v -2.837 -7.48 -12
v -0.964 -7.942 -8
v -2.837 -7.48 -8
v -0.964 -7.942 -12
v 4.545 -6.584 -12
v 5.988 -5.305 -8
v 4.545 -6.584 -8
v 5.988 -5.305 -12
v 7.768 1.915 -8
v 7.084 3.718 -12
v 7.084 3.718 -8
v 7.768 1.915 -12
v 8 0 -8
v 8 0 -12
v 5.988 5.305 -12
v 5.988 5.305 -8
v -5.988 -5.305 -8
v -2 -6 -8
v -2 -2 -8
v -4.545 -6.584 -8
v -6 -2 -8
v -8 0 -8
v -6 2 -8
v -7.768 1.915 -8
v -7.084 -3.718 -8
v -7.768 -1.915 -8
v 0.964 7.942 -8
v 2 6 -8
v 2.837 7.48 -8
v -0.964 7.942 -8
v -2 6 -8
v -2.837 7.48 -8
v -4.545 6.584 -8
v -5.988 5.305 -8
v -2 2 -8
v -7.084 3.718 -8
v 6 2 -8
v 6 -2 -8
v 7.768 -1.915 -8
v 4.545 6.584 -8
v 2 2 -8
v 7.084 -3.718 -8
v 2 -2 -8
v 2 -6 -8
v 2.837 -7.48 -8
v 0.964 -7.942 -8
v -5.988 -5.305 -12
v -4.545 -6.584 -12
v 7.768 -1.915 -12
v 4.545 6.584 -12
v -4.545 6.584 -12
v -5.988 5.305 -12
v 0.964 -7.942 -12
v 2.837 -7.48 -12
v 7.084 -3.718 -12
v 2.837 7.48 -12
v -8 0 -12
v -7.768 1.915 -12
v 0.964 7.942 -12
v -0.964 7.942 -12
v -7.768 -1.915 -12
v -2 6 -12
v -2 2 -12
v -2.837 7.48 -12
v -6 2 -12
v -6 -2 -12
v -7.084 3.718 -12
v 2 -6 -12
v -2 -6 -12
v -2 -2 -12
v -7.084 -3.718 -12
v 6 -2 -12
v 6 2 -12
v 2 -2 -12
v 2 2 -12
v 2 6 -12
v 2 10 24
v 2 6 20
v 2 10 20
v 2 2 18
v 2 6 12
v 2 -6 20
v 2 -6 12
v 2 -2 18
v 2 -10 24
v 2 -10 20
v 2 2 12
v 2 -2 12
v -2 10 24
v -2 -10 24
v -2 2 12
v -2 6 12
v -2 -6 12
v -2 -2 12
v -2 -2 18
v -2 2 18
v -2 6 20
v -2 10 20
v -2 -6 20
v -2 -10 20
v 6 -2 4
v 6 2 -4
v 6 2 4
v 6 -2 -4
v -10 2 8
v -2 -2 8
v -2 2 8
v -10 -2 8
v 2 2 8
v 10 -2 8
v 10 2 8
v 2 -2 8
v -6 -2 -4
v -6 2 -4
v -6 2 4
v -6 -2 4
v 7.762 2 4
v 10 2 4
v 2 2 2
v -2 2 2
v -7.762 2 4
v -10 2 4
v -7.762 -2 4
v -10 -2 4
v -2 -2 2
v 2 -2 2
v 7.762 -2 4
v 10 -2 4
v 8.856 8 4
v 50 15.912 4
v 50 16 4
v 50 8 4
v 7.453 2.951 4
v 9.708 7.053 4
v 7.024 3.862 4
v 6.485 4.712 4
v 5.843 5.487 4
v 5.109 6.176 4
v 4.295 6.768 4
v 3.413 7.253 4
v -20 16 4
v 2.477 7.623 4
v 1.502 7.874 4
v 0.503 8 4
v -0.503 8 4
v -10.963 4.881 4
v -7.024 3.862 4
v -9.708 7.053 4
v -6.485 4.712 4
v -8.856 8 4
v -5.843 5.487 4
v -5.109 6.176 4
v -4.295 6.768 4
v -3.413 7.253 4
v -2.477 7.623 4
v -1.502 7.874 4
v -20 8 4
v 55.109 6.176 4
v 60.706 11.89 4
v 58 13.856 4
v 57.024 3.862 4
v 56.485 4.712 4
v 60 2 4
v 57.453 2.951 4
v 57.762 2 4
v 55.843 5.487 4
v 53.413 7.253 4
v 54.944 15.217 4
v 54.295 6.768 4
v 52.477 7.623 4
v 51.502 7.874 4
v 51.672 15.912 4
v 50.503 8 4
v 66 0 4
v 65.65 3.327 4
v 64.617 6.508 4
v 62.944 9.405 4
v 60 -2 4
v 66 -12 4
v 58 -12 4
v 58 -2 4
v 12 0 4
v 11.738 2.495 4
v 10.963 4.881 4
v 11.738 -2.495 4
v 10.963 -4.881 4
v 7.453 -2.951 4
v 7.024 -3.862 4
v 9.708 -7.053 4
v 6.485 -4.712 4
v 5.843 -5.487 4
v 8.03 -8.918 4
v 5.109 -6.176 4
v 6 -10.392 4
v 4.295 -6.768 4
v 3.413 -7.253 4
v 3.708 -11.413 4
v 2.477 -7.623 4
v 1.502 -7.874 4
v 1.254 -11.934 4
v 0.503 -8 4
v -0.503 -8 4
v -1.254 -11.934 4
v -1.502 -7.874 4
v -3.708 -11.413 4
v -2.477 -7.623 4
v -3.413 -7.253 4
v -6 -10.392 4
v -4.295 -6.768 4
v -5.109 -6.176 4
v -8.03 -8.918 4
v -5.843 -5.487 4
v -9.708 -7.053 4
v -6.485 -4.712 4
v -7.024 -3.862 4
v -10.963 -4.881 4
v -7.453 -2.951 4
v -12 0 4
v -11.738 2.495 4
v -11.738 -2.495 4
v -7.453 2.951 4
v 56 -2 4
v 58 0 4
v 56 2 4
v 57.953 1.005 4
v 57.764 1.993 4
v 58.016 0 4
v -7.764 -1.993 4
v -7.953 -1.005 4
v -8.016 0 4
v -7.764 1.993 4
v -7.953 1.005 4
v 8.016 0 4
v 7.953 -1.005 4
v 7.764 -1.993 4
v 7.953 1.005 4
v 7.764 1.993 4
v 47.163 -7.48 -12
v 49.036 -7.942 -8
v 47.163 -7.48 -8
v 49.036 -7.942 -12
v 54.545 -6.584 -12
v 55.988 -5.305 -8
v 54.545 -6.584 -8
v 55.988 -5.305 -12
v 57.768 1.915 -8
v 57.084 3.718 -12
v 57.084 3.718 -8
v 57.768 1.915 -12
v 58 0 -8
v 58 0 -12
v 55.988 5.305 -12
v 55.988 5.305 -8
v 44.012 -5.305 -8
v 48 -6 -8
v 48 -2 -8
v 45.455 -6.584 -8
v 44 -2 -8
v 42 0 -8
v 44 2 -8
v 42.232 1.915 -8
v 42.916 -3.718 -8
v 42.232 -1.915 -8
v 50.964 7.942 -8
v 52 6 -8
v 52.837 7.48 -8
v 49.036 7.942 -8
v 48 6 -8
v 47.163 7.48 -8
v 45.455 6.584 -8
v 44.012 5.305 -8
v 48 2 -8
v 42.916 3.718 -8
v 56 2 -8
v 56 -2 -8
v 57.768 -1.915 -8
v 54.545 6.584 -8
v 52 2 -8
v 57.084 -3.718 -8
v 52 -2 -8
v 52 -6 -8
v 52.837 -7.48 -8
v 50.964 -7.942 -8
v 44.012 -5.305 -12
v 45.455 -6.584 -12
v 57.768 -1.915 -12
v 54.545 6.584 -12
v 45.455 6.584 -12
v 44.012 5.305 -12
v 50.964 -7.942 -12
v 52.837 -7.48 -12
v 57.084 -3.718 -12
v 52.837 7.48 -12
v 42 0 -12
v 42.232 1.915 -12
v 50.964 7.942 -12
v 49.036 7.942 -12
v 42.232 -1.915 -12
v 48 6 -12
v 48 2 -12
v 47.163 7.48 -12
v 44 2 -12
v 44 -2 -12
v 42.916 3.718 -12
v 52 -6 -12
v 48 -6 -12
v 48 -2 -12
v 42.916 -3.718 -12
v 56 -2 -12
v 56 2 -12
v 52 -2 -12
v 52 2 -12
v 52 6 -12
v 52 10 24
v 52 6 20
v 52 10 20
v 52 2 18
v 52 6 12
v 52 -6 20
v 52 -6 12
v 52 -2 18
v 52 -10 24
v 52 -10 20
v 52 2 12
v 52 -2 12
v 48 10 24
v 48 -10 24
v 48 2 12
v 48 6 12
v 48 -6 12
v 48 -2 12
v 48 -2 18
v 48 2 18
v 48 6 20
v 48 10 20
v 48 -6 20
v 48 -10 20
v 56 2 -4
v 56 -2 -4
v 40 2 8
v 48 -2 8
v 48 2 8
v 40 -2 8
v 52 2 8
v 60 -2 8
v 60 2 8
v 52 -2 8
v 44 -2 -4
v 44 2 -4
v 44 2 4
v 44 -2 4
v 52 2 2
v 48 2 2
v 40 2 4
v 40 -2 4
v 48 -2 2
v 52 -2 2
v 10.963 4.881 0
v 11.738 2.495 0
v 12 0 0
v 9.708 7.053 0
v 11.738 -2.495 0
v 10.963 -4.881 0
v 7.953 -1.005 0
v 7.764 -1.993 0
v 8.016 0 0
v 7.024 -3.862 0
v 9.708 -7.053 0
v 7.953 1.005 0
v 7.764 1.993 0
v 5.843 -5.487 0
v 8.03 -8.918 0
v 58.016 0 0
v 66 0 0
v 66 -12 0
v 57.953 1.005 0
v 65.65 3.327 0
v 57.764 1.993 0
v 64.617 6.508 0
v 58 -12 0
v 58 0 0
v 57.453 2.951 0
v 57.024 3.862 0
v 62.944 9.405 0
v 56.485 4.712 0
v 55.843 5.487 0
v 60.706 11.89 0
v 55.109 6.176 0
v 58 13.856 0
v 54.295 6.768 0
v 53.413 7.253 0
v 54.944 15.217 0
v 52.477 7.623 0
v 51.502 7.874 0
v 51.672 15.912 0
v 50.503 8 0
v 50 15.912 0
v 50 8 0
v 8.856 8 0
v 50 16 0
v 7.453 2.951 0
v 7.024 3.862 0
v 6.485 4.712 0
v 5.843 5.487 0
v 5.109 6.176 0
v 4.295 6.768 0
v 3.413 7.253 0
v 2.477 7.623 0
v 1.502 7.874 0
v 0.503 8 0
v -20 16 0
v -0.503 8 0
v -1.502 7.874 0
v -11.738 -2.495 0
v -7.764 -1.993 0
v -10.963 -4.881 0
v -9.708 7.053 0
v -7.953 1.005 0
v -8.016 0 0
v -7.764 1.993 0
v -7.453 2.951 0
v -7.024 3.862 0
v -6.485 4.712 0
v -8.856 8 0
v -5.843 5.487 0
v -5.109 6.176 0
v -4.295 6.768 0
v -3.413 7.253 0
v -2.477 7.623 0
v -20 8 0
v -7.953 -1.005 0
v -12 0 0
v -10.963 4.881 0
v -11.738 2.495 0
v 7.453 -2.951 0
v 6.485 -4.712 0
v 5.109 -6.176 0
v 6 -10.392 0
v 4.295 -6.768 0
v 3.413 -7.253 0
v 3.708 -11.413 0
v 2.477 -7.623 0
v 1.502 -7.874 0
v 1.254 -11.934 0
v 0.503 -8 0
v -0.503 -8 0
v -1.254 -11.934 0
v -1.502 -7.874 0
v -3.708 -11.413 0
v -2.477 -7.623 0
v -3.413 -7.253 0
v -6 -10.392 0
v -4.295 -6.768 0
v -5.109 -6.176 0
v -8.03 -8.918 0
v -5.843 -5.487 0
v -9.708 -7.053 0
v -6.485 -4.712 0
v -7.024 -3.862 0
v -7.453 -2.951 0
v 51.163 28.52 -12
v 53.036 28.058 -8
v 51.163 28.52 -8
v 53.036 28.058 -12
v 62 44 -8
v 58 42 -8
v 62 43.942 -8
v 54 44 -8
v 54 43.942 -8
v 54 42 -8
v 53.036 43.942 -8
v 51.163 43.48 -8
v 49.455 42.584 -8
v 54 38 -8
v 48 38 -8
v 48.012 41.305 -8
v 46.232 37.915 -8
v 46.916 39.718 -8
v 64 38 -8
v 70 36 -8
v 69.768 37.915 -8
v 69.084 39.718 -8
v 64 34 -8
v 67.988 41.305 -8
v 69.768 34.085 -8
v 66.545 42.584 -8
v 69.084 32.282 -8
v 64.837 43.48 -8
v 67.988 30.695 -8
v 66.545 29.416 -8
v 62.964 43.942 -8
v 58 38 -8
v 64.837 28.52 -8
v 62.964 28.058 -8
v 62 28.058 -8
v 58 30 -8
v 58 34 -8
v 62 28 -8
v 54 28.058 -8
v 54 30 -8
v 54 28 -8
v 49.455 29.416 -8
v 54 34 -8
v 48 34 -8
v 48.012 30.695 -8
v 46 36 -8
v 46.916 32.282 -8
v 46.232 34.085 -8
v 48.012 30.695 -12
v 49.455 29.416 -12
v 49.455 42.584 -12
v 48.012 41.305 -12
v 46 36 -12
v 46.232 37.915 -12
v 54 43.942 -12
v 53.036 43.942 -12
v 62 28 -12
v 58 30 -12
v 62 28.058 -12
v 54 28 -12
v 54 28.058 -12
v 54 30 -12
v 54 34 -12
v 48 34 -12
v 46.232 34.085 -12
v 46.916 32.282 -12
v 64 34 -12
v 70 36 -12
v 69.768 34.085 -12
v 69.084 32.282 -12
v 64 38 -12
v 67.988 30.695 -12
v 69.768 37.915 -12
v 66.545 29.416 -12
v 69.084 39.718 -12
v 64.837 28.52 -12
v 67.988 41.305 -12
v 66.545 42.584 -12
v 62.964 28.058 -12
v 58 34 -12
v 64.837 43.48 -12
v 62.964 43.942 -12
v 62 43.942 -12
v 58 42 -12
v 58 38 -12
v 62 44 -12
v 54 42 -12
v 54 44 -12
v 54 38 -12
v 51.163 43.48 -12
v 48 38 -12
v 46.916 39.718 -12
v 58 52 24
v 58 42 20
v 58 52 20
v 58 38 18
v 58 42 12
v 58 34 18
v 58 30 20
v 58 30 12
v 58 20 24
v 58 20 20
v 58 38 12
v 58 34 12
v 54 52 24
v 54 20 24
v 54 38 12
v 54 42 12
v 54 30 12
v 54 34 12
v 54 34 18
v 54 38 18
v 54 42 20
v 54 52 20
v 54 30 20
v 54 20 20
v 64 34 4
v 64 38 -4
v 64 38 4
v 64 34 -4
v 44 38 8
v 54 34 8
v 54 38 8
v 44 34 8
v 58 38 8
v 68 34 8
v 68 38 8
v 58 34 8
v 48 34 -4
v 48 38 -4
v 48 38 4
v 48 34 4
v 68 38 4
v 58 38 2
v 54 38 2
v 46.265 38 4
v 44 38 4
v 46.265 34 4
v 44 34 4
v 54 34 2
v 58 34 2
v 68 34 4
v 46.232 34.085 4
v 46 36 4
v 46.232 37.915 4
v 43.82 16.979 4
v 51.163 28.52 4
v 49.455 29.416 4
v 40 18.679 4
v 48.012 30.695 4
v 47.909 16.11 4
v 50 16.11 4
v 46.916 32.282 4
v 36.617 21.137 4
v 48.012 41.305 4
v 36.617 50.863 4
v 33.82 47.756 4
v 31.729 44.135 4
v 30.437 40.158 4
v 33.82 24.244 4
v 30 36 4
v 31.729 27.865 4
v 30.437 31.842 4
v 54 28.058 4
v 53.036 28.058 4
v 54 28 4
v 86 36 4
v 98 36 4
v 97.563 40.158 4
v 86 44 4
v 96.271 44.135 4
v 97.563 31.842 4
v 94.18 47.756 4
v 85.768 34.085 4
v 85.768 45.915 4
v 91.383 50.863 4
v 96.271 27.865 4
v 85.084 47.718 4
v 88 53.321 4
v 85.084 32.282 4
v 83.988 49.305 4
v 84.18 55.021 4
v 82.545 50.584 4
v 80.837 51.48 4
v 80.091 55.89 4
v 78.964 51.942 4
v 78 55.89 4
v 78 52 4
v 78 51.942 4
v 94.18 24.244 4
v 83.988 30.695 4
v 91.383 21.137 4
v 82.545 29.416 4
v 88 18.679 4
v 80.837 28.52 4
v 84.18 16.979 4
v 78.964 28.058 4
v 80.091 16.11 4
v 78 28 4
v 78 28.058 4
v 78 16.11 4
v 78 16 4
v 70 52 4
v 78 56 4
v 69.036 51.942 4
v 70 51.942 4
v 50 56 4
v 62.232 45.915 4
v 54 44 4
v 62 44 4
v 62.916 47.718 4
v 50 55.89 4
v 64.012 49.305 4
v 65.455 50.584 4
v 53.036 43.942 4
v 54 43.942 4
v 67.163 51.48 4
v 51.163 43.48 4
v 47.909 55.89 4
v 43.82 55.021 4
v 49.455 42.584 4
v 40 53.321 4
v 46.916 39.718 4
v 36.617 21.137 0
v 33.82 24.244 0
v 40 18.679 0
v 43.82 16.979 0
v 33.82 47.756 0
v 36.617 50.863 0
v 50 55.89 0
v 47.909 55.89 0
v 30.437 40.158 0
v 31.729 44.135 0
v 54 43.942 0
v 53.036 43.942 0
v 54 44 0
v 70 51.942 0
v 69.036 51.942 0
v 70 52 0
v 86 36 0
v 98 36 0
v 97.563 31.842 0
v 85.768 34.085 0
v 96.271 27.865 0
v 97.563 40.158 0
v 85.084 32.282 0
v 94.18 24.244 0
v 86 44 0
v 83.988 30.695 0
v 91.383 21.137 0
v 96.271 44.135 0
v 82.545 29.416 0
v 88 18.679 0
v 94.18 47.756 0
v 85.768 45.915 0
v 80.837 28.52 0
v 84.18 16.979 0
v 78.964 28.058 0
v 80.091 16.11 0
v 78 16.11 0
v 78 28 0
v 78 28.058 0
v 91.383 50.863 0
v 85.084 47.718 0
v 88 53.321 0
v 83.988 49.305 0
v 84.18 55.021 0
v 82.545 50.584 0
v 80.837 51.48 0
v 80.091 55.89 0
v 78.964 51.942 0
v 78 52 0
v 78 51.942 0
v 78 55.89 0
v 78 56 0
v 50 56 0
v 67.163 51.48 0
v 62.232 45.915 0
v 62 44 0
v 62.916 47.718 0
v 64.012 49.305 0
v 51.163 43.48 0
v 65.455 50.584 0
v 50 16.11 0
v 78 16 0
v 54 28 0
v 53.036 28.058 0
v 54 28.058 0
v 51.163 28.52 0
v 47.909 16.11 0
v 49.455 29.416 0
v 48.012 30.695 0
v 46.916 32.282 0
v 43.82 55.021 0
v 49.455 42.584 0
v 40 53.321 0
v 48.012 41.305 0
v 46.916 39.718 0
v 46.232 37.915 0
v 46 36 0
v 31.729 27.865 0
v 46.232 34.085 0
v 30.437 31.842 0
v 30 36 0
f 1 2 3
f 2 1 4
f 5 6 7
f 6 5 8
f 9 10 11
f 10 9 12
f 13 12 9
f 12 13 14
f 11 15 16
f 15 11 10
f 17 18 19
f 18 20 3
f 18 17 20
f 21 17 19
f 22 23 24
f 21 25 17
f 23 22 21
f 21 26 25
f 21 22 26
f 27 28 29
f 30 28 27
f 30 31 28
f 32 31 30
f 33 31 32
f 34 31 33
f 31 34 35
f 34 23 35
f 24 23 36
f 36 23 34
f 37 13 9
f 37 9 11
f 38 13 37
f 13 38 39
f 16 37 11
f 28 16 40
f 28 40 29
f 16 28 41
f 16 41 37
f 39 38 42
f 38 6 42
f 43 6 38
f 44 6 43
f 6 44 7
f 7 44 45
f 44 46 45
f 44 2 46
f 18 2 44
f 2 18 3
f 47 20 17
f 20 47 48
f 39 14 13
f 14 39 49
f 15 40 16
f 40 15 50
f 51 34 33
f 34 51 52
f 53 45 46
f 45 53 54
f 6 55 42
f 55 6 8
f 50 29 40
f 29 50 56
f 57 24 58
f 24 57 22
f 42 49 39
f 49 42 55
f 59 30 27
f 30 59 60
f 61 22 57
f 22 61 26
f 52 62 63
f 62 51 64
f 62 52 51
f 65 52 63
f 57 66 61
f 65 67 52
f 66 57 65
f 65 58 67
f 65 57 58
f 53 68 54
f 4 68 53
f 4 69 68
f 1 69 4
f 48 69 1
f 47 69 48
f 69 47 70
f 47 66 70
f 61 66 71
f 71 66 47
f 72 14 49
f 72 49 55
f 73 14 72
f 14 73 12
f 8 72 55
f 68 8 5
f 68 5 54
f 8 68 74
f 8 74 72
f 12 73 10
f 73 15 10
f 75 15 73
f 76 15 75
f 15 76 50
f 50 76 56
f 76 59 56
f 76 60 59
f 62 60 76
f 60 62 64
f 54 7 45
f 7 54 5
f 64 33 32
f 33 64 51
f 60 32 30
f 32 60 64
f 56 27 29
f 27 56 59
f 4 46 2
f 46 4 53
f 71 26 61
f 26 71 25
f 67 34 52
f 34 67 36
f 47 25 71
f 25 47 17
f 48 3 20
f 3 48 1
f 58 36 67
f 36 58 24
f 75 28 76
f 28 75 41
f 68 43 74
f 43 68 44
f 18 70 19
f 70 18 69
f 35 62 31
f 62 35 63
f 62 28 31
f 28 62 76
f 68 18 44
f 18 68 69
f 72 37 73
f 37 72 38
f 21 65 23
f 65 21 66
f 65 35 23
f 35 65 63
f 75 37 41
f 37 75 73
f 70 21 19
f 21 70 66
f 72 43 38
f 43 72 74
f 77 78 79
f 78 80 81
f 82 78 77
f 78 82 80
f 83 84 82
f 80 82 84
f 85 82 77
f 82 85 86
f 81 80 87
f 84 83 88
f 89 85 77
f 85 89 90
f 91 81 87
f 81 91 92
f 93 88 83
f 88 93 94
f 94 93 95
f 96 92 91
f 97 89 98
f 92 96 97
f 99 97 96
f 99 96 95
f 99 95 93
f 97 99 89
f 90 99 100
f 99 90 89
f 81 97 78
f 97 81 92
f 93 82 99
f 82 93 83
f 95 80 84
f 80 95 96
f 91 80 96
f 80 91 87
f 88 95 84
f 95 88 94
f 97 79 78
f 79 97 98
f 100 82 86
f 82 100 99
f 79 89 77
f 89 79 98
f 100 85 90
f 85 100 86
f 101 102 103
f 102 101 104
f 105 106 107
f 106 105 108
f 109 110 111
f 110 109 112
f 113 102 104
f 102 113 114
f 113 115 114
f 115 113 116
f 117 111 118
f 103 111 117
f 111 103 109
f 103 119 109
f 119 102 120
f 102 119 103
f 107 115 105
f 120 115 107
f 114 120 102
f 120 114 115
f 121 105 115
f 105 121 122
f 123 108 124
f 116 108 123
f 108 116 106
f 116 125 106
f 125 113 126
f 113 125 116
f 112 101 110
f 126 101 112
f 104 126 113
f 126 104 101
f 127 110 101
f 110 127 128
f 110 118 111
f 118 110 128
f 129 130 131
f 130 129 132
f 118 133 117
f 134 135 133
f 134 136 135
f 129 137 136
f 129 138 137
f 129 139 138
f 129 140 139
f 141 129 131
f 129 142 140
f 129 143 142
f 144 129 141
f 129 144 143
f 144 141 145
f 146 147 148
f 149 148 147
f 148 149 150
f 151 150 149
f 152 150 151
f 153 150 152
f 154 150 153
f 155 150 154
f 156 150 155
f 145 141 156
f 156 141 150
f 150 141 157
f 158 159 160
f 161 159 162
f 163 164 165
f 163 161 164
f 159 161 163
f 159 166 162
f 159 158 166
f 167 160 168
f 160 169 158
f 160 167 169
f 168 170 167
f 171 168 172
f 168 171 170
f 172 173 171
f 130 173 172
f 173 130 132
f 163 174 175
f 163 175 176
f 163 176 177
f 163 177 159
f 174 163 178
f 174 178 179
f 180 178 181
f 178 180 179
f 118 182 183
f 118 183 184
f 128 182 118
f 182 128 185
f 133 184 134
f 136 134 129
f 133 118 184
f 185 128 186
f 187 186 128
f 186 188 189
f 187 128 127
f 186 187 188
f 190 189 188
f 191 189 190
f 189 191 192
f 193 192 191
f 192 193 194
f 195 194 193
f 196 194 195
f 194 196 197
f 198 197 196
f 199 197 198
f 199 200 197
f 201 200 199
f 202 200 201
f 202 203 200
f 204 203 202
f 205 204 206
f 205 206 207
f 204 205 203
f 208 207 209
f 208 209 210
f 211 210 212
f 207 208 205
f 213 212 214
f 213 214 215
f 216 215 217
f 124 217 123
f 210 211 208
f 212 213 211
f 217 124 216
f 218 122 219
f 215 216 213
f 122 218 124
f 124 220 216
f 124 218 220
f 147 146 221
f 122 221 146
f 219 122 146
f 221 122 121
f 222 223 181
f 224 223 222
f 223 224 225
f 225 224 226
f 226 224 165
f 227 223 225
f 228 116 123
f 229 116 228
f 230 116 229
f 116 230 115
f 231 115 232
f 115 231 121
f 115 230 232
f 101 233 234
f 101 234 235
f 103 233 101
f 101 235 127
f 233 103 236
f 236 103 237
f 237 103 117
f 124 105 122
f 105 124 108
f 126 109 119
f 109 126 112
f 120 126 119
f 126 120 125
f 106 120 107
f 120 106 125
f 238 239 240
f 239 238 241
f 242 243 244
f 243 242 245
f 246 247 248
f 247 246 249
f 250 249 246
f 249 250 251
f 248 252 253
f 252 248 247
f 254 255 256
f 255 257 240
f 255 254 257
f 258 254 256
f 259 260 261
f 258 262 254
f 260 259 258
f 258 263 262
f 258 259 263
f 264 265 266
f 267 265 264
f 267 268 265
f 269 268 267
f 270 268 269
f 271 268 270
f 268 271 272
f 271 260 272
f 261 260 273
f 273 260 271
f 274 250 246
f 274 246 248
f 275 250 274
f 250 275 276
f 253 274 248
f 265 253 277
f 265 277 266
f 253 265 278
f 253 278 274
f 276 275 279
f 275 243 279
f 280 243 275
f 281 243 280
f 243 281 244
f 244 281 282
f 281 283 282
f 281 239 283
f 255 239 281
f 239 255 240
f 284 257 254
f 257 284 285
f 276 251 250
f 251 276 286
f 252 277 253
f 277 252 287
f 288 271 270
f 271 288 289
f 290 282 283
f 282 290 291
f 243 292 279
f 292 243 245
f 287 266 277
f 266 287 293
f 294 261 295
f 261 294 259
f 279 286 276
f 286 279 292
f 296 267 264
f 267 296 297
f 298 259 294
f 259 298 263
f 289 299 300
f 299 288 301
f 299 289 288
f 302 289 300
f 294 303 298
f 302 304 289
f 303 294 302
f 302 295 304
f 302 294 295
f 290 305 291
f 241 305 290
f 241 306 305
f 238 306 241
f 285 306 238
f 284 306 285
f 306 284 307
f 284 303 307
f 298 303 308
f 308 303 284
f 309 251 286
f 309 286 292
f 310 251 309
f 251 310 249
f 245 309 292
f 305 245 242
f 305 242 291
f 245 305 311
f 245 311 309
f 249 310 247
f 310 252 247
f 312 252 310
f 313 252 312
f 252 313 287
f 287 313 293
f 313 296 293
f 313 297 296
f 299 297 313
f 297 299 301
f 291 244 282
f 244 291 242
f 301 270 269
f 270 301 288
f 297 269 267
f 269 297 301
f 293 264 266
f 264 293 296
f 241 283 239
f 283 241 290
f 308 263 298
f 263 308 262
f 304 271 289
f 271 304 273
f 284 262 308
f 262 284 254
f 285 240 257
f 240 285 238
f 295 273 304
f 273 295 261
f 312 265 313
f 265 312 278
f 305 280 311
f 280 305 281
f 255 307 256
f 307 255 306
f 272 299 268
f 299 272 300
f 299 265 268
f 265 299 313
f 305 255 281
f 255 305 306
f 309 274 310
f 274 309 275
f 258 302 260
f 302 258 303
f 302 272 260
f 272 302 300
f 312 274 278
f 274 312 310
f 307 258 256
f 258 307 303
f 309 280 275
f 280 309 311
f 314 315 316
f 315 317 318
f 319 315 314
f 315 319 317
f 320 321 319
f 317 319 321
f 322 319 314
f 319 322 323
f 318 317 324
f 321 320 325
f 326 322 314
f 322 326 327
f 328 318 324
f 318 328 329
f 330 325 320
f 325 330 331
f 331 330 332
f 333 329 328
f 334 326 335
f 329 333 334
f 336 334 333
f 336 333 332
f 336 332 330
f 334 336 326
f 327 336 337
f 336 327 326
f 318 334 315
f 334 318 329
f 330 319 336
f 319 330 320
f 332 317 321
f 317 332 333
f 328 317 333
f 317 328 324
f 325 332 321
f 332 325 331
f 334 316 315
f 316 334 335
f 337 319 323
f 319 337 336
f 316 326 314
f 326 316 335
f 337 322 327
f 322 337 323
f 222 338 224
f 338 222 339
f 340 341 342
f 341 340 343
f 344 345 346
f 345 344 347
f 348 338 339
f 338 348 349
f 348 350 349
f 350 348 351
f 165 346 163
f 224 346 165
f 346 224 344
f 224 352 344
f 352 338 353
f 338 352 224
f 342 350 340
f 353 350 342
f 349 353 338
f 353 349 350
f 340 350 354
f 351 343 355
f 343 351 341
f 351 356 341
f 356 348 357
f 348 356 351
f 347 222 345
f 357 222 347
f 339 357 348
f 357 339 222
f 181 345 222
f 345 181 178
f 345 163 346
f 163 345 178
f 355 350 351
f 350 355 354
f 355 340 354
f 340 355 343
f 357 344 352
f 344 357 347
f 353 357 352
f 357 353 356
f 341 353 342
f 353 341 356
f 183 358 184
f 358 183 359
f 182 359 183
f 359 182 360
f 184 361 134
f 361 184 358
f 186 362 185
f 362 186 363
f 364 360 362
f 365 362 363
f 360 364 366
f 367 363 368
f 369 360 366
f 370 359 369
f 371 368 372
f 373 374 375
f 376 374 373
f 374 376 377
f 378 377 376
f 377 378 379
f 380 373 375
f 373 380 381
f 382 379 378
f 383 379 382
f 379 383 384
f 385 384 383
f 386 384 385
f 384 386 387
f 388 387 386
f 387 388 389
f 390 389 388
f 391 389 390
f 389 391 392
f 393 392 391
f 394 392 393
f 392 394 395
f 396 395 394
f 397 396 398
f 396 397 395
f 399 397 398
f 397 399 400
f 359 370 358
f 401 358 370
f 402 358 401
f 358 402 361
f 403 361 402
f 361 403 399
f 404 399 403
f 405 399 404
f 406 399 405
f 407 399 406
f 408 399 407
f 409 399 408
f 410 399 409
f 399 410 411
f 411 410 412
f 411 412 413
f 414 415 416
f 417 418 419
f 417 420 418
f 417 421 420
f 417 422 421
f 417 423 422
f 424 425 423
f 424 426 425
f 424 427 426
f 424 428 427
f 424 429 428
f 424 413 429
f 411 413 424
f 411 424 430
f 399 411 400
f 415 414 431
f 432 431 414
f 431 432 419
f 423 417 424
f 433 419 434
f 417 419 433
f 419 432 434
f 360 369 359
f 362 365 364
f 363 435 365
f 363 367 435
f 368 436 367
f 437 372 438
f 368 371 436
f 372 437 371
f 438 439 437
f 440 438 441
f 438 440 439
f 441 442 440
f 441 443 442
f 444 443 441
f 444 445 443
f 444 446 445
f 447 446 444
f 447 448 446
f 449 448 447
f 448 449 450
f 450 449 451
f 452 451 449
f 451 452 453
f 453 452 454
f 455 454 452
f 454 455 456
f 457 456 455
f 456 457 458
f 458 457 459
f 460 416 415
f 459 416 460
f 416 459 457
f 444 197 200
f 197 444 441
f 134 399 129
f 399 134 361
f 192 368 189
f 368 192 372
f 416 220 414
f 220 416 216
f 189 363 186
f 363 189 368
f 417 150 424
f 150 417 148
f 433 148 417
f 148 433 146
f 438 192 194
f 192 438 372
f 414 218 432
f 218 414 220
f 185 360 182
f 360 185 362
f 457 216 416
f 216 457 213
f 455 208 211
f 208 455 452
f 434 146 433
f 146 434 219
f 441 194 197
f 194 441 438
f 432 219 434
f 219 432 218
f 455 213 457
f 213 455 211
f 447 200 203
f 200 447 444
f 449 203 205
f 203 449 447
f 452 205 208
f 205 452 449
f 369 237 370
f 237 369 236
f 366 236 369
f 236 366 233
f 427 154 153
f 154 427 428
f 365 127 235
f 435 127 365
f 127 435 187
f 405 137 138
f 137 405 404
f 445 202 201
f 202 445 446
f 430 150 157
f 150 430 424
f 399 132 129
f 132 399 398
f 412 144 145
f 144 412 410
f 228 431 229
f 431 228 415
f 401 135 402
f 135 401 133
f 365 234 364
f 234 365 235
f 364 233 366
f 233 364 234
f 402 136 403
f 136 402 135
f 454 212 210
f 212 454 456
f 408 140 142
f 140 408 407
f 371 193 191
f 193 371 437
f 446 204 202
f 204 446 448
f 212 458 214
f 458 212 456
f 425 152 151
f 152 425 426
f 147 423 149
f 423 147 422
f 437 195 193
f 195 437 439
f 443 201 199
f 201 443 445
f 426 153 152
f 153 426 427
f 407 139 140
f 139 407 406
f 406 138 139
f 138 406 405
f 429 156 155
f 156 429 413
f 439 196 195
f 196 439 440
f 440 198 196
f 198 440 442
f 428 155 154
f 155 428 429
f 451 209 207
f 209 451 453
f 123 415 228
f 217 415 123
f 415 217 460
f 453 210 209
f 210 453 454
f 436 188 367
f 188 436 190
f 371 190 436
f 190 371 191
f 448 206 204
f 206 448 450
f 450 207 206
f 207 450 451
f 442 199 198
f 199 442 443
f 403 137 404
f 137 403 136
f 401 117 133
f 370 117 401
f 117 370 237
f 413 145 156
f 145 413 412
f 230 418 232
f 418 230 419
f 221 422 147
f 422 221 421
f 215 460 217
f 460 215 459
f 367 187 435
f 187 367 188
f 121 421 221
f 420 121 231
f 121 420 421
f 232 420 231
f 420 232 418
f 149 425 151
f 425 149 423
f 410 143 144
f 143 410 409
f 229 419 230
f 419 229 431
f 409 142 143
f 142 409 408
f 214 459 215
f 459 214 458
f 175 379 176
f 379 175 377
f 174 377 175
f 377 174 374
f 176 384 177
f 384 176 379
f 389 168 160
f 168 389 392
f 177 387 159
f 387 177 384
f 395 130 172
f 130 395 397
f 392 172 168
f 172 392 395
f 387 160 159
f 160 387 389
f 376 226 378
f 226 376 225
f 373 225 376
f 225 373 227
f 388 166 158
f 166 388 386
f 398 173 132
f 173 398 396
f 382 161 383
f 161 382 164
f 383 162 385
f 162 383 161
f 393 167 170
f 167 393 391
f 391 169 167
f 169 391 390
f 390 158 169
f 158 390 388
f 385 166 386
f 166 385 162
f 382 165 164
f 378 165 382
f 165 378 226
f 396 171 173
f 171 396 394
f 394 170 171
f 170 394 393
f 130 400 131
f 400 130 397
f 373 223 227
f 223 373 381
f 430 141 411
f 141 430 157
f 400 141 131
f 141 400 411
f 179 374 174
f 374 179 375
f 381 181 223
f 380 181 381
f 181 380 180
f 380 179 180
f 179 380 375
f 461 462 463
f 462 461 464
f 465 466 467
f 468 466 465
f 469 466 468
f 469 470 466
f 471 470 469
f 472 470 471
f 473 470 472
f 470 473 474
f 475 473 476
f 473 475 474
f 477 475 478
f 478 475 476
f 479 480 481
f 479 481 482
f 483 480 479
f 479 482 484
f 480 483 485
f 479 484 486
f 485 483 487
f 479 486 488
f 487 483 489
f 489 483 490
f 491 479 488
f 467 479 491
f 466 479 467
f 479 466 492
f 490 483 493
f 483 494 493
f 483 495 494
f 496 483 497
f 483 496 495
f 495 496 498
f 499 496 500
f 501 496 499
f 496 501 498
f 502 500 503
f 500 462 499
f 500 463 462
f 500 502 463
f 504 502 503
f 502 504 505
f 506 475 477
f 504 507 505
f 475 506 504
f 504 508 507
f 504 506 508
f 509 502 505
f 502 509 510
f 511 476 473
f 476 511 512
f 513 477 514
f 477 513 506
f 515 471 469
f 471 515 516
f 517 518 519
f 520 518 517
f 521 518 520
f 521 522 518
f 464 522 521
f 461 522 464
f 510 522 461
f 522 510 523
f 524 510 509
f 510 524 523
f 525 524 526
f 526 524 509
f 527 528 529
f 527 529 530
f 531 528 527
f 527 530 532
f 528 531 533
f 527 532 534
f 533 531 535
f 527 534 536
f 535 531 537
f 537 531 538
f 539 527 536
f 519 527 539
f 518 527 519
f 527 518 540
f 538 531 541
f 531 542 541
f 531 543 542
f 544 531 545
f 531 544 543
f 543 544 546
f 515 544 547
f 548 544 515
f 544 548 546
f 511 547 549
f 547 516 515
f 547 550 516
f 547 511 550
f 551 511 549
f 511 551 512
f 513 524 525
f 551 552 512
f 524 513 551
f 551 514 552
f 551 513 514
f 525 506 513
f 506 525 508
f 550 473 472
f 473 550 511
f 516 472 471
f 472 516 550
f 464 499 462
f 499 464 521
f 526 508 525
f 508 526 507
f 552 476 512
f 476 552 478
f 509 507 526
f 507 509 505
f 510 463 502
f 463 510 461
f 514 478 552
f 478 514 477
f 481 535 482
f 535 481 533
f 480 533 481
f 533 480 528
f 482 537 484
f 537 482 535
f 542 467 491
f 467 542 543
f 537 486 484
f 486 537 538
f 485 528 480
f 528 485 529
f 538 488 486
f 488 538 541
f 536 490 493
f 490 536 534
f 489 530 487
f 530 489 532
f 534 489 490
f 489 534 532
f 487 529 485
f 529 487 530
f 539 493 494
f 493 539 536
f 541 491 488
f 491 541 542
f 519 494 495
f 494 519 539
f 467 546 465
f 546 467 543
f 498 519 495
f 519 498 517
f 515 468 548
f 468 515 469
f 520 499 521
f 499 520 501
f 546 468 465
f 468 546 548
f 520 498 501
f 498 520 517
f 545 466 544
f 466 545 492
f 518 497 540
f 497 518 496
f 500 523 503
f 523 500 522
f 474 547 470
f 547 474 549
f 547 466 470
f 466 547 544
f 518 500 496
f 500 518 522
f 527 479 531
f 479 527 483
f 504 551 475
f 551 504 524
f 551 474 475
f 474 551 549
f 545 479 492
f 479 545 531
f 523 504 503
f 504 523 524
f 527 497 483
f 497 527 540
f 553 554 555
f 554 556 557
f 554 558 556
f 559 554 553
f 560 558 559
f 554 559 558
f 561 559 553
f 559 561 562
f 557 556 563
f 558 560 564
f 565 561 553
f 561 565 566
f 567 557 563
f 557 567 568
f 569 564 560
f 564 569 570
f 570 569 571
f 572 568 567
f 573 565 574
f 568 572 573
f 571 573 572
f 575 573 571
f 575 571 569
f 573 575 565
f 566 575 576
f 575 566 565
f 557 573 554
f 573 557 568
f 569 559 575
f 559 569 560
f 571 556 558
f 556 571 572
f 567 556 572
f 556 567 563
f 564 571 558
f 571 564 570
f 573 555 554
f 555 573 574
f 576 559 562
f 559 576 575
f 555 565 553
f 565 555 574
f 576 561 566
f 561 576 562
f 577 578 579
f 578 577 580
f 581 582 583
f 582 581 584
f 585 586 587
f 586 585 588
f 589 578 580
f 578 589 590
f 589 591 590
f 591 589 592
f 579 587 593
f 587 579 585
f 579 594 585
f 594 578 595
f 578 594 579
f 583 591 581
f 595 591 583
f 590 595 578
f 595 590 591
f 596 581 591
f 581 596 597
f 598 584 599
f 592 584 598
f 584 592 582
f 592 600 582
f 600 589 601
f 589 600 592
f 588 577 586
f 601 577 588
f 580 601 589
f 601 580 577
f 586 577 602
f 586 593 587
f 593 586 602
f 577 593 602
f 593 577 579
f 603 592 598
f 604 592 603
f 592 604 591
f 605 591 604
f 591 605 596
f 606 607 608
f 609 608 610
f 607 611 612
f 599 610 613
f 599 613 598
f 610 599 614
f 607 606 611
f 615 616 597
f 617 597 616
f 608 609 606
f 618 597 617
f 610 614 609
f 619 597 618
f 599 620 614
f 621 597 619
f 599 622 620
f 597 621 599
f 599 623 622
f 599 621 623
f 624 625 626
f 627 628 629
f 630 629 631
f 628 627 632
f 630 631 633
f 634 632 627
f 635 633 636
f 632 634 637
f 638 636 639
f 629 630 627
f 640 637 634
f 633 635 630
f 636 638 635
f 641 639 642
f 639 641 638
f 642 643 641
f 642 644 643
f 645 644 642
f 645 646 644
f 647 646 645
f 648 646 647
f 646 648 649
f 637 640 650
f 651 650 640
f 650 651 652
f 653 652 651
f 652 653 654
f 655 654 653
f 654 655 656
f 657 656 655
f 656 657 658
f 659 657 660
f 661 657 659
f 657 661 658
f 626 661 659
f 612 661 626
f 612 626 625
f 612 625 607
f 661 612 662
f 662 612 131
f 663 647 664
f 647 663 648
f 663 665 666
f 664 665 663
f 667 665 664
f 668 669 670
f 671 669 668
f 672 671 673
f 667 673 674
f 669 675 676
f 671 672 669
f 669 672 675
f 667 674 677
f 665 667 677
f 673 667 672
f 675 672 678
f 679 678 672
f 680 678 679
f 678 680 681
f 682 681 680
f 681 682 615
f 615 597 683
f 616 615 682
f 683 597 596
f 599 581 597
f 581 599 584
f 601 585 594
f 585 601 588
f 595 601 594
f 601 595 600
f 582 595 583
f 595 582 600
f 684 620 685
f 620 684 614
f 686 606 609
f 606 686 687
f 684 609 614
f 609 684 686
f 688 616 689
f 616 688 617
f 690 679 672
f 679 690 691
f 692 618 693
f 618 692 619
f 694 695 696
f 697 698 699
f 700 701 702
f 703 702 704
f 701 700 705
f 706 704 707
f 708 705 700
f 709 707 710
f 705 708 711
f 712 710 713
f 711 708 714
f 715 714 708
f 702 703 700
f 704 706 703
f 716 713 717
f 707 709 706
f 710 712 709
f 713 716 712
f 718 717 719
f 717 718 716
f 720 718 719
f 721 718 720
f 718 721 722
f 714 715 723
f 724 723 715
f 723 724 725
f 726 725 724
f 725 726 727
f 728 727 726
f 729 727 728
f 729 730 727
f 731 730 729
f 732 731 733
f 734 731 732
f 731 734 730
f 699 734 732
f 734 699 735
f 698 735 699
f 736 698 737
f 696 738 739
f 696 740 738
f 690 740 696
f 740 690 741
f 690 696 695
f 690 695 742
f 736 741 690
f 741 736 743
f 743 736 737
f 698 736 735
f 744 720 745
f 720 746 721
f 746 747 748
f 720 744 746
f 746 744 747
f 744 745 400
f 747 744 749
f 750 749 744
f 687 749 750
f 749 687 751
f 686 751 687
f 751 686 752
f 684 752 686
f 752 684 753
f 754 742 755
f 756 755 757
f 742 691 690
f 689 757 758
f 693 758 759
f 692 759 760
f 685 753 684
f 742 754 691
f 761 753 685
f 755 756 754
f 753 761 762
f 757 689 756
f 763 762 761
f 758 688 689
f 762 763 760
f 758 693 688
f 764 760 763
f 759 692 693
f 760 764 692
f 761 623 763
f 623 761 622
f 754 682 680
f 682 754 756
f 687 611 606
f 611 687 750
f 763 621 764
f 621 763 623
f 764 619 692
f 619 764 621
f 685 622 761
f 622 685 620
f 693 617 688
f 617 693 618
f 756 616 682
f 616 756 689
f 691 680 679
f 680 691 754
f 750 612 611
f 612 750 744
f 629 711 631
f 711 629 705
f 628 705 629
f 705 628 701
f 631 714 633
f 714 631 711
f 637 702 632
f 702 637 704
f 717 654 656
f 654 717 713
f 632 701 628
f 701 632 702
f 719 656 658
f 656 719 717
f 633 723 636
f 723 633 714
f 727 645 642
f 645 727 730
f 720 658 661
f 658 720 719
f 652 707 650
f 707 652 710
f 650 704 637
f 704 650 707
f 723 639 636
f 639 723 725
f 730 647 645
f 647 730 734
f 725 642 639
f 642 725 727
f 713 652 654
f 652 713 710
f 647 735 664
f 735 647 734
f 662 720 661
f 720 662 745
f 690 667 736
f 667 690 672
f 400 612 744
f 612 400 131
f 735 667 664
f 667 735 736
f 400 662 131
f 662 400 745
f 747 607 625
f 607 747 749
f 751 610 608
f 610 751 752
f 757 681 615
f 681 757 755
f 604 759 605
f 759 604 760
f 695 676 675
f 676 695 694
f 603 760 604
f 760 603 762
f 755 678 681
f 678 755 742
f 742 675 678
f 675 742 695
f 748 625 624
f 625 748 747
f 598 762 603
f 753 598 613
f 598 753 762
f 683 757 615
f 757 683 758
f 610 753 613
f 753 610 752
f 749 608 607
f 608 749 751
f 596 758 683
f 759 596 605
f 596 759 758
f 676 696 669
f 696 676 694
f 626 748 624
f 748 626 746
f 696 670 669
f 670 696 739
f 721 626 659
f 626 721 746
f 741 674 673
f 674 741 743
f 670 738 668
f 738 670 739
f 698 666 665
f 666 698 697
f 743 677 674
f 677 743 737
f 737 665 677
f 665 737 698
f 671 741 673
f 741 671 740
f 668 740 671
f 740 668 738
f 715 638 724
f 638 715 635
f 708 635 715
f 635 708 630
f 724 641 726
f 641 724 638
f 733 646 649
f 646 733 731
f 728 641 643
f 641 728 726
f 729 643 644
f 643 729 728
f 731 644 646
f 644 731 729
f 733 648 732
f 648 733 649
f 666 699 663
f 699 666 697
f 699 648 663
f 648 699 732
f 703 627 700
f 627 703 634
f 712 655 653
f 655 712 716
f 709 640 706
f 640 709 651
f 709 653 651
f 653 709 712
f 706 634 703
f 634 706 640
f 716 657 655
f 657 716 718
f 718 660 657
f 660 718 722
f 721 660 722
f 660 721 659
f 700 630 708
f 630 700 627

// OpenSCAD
// file: utils/cylinder-outer.scad
module cylinder_outer(height,radius,fn){
  fudge = 1/cos(180/fn);
  cylinder(h=height,r=radius*fudge,$fn=fn);
}
// file: dimensions.scad
/*
 * This file regroup all the common dimensions, angles, and repetitions
 */
$margin = 2;

// how many harmonica do you want to store on a given row?
$horizontalPlacements = 5;
$verticalPlacements = 3;

/* hole around the harmonica
 *    ______________
 *   /             /|
 *  /_____________/ | <- height_gap
 *  |             | |
 *  |             | /
 *  |_____________|/ <- thick_gap
 *       ^ length_gap
 */
$thickGap = 25;
//$height_gap = 30; <- this one was a bit tight for Seydels and too tight for the old golden melody
$heightGap = 35; // <- I'll increase that somewhat so I can also install some felt inside the box.
$lengthGap = 105;

// base material thickness, this represent the thickness of the most commonly used material.
$materialThickness = 4;

/* On different rows, harmonica will be seating more or less deelply inside (higher rows deepers than lower ones).
 * You'll probably want to tweak that a bit:
 * - make then seat far enough that the lid doesn't need to be too huge to cover them
 * - not too far so that they are easy to pick up
 * - have a good difference between the different rows so you can see them all nicely
*/
$minHarpSeating = 55;
$maxHarpSeating = 85;

// the difference between the harp seatings dictates how slanted should the inside slant be.
deltaSeating = $maxHarpSeating - $minHarpSeating;
deltaHeight = ($heightGap + $materialThickness) * ($verticalPlacements - 1);
$slantAngle = 90 - atan(deltaHeight / deltaSeating);
echo("slant angle -> ", $slantAngle);


/*
 * inset looks like: 
 *
 * =================================== <- outset border
 * |\
 * | \ <-     maxHarpSeating     ->
 * |  \----------------------------
 * |   \
 * |    \
 * |     \-------------------------      <- vertical separator
 * |      \
 * |       \
 * |        \----------------------
 * | slant ->\
 * |          \<- minHarpSeating ->
 * ===================================
 *                                 \_/ 
 *                                  ^outsetMargin
 *  \_________insetLength_________/
 */

// how far should the inset goes?
insetHeight = $heightGap + ($heightGap + $materialThickness) * ($verticalPlacements - 1);
slantDeltaLength = insetHeight * deltaSeating / deltaHeight;
$insetMargin = 10;
$insetLength = $minHarpSeating + slantDeltaLength + $materialThickness + $insetMargin;
echo("insetLength -> ", $insetLength);
// how much futher should the outset cover?
$outsetMargin = 5;

// Box dimensions: 
$boxWidth = $horizontalPlacements * ($thickGap + $materialThickness) + $materialThickness;
$boxHeight = $insetLength + $outsetMargin;
$boxDepth = $verticalPlacements * ($heightGap + $materialThickness) + $materialThickness;

// the angle at which the box should sit when the lid is opened
// !TODO adjust the angle if you want a flat part on the top of the standing lid
$boxTiltingAngle = 0;

// lid stuff
$lidRadius = $heightGap * 2/3;
$lidHeightClearance = $lengthGap - $minHarpSeating + $margin;
$lidHeight = $lidRadius + $lidHeightClearance;
// main file
include <./dimensions.scad>
include <./utils/cylinder-outer.scad>

margin = 2;

module pivot() {
  difference() {
    cylinder($materialThickness, r = 2*$materialThickness, center = false);
    translate([-.5*$materialThickness, -1.5*$materialThickness, -$materialThickness])
      cube([$materialThickness, 3*$materialThickness, 3*$materialThickness]);
    translate([-1.5*$materialThickness, -.5*$materialThickness, -$materialThickness])
      cube([3*$materialThickness, $materialThickness, 3*$materialThickness]);
  }
}

module insertA(extraLength = 0) {
  difference() {
    cube([$materialThickness, 3*$materialThickness, 3*$materialThickness]);
    translate([-margin, $materialThickness, -margin])
    cube([$materialThickness + 2*margin, $materialThickness, margin + 1.5 *$materialThickness]);
  }
  translate([0, -(1+(extraLength/2))*$materialThickness, 2*$materialThickness])
    cube([$materialThickness, (5+extraLength)*$materialThickness, $materialThickness]);
}
module insertB(){
  difference() {
    union() {
      cube([3*$materialThickness, $materialThickness, 3*$materialThickness]);
      translate([-$materialThickness, 0, 2*$materialThickness])
      cube([5*$materialThickness, $materialThickness, $materialThickness]);
    }
    translate([$materialThickness, -margin, 1.5*$materialThickness ])
      cube([$materialThickness, $materialThickness + 2*margin, margin + 1.5 *$materialThickness]);
  }
}
module insertC(){
  difference() {
    union() {
      cube([4*$materialThickness, $materialThickness, 3*$materialThickness]);
      translate([-$materialThickness, 0, 2*$materialThickness])
      cube([6*$materialThickness, $materialThickness, $materialThickness]);
    }
    translate([1.5* $materialThickness, -margin, 1.5*$materialThickness ])
      cube([$materialThickness, $materialThickness + 2*margin, margin + 1.5 *$materialThickness]);
  }
}

module pivotAssembly(spread = false) {
  translate([0,0,$materialThickness + (spread? (-2*$materialThickness -2 * margin) : 0)])
  pivot();
  translate([-.5*$materialThickness, -1.5*$materialThickness, spread? (3*$materialThickness + 2*margin) : 0])
  insertA();
  translate([-1.5*$materialThickness, -.5*$materialThickness, 0])
  insertB();
}
module bottomNotch() {

}

module movingArm(length) {
  difference() {
    cylinder($materialThickness, r = 3*$materialThickness, center = false);
    translate([0,0,-$materialThickness])
    cylinder_outer(3* $materialThickness, 2*$materialThickness, fn=50);
  }
  translate([-20, 2*$materialThickness, 0])
  cube([20 + length, 2*$materialThickness, $materialThickness]);
  translate([length, 0, 0])
  difference() {
    cylinder($materialThickness, r = 4*$materialThickness, center = false);
    translate([0,0,-$materialThickness])
      cylinder_outer(3* $materialThickness, 2*$materialThickness, fn=50);
    translate([-6*$materialThickness,-3*$materialThickness,-$materialThickness])
      cube(6*$materialThickness);
    translate([-3*$materialThickness,-6*$materialThickness,-$materialThickness])
      cube(6*$materialThickness);
  }
  translate([length+2*$materialThickness, -3*$materialThickness,0])
    cube([2*$materialThickness, 3*$materialThickness, $materialThickness]);
}

module offCenterPiece(){
  difference() {
    translate([-1*$materialThickness, -0*$materialThickness, 0])
      oblongShape(r = 5*$materialThickness, flatLenght = 7*$materialThickness);
    translate([0,0,-$materialThickness])
      union() {
        oblongShape(height = 3*$materialThickness, flatLenght = 3*$materialThickness);
        translate([4*$materialThickness, 2*$materialThickness, 0])
          oblongShape(height = 3*$materialThickness, flatLenght = 2*$materialThickness);
        translate([3*$materialThickness, 0, 0])
          oblongShape(height = 3*$materialThickness, flatLenght = 3*$materialThickness);
        translate([$materialThickness, 0, 0])
          cube([7*$materialThickness, 2*$materialThickness, 3*$materialThickness]);
      }
  }
}
module oblongShape(r= 2*$materialThickness, height = $materialThickness, flatLenght = $materialThickness) {
  cylinder(height, r = r, center = false);
  translate([flatLenght, 0, 0])
    cylinder(height, r = r, center = false);
  translate([0, -r, 0])
    cube([flatLenght, 2*r, height]);
}

module oblongPivot() {
  difference() {
    oblongShape(flatLenght = 2*$materialThickness);
    translate([0, -1.5*$materialThickness, -$materialThickness])
      cube([$materialThickness, 3*$materialThickness, 3*$materialThickness]);
    translate([-1.5*$materialThickness, -.5*$materialThickness, -$materialThickness])
      cube([4*$materialThickness, $materialThickness, 3*$materialThickness]);

  }
}

module insertD() {
  insertA(3);
}

module oblongPivotAssembly(spread = false) {
  translate([0,0,$materialThickness + (spread? (-2*$materialThickness -2 * margin) : 0)])
    oblongPivot();
  translate([0*$materialThickness, -1.5*$materialThickness, spread? (3*$materialThickness + 2*margin) : 0])
    insertD();
  translate([-1.5*$materialThickness, -.5*$materialThickness, 0])
  insertC();
}

module offCenterLock(spread = false) {
  translate([0,0,-$materialThickness])
    oblongPivotAssembly(spread);
  offCenterPiece();
}

module swingLock(length = 50, spread = false) {
  translate([0,0,-$materialThickness])
    pivotAssembly(spread);
  translate([length, 0, -$materialThickness])
    pivotAssembly(spread);
  movingArm(length);

  translate([length + 1*$materialThickness, 9*$materialThickness,0])
  offCenterLock(spread);
}
swingLock(spread = true);
